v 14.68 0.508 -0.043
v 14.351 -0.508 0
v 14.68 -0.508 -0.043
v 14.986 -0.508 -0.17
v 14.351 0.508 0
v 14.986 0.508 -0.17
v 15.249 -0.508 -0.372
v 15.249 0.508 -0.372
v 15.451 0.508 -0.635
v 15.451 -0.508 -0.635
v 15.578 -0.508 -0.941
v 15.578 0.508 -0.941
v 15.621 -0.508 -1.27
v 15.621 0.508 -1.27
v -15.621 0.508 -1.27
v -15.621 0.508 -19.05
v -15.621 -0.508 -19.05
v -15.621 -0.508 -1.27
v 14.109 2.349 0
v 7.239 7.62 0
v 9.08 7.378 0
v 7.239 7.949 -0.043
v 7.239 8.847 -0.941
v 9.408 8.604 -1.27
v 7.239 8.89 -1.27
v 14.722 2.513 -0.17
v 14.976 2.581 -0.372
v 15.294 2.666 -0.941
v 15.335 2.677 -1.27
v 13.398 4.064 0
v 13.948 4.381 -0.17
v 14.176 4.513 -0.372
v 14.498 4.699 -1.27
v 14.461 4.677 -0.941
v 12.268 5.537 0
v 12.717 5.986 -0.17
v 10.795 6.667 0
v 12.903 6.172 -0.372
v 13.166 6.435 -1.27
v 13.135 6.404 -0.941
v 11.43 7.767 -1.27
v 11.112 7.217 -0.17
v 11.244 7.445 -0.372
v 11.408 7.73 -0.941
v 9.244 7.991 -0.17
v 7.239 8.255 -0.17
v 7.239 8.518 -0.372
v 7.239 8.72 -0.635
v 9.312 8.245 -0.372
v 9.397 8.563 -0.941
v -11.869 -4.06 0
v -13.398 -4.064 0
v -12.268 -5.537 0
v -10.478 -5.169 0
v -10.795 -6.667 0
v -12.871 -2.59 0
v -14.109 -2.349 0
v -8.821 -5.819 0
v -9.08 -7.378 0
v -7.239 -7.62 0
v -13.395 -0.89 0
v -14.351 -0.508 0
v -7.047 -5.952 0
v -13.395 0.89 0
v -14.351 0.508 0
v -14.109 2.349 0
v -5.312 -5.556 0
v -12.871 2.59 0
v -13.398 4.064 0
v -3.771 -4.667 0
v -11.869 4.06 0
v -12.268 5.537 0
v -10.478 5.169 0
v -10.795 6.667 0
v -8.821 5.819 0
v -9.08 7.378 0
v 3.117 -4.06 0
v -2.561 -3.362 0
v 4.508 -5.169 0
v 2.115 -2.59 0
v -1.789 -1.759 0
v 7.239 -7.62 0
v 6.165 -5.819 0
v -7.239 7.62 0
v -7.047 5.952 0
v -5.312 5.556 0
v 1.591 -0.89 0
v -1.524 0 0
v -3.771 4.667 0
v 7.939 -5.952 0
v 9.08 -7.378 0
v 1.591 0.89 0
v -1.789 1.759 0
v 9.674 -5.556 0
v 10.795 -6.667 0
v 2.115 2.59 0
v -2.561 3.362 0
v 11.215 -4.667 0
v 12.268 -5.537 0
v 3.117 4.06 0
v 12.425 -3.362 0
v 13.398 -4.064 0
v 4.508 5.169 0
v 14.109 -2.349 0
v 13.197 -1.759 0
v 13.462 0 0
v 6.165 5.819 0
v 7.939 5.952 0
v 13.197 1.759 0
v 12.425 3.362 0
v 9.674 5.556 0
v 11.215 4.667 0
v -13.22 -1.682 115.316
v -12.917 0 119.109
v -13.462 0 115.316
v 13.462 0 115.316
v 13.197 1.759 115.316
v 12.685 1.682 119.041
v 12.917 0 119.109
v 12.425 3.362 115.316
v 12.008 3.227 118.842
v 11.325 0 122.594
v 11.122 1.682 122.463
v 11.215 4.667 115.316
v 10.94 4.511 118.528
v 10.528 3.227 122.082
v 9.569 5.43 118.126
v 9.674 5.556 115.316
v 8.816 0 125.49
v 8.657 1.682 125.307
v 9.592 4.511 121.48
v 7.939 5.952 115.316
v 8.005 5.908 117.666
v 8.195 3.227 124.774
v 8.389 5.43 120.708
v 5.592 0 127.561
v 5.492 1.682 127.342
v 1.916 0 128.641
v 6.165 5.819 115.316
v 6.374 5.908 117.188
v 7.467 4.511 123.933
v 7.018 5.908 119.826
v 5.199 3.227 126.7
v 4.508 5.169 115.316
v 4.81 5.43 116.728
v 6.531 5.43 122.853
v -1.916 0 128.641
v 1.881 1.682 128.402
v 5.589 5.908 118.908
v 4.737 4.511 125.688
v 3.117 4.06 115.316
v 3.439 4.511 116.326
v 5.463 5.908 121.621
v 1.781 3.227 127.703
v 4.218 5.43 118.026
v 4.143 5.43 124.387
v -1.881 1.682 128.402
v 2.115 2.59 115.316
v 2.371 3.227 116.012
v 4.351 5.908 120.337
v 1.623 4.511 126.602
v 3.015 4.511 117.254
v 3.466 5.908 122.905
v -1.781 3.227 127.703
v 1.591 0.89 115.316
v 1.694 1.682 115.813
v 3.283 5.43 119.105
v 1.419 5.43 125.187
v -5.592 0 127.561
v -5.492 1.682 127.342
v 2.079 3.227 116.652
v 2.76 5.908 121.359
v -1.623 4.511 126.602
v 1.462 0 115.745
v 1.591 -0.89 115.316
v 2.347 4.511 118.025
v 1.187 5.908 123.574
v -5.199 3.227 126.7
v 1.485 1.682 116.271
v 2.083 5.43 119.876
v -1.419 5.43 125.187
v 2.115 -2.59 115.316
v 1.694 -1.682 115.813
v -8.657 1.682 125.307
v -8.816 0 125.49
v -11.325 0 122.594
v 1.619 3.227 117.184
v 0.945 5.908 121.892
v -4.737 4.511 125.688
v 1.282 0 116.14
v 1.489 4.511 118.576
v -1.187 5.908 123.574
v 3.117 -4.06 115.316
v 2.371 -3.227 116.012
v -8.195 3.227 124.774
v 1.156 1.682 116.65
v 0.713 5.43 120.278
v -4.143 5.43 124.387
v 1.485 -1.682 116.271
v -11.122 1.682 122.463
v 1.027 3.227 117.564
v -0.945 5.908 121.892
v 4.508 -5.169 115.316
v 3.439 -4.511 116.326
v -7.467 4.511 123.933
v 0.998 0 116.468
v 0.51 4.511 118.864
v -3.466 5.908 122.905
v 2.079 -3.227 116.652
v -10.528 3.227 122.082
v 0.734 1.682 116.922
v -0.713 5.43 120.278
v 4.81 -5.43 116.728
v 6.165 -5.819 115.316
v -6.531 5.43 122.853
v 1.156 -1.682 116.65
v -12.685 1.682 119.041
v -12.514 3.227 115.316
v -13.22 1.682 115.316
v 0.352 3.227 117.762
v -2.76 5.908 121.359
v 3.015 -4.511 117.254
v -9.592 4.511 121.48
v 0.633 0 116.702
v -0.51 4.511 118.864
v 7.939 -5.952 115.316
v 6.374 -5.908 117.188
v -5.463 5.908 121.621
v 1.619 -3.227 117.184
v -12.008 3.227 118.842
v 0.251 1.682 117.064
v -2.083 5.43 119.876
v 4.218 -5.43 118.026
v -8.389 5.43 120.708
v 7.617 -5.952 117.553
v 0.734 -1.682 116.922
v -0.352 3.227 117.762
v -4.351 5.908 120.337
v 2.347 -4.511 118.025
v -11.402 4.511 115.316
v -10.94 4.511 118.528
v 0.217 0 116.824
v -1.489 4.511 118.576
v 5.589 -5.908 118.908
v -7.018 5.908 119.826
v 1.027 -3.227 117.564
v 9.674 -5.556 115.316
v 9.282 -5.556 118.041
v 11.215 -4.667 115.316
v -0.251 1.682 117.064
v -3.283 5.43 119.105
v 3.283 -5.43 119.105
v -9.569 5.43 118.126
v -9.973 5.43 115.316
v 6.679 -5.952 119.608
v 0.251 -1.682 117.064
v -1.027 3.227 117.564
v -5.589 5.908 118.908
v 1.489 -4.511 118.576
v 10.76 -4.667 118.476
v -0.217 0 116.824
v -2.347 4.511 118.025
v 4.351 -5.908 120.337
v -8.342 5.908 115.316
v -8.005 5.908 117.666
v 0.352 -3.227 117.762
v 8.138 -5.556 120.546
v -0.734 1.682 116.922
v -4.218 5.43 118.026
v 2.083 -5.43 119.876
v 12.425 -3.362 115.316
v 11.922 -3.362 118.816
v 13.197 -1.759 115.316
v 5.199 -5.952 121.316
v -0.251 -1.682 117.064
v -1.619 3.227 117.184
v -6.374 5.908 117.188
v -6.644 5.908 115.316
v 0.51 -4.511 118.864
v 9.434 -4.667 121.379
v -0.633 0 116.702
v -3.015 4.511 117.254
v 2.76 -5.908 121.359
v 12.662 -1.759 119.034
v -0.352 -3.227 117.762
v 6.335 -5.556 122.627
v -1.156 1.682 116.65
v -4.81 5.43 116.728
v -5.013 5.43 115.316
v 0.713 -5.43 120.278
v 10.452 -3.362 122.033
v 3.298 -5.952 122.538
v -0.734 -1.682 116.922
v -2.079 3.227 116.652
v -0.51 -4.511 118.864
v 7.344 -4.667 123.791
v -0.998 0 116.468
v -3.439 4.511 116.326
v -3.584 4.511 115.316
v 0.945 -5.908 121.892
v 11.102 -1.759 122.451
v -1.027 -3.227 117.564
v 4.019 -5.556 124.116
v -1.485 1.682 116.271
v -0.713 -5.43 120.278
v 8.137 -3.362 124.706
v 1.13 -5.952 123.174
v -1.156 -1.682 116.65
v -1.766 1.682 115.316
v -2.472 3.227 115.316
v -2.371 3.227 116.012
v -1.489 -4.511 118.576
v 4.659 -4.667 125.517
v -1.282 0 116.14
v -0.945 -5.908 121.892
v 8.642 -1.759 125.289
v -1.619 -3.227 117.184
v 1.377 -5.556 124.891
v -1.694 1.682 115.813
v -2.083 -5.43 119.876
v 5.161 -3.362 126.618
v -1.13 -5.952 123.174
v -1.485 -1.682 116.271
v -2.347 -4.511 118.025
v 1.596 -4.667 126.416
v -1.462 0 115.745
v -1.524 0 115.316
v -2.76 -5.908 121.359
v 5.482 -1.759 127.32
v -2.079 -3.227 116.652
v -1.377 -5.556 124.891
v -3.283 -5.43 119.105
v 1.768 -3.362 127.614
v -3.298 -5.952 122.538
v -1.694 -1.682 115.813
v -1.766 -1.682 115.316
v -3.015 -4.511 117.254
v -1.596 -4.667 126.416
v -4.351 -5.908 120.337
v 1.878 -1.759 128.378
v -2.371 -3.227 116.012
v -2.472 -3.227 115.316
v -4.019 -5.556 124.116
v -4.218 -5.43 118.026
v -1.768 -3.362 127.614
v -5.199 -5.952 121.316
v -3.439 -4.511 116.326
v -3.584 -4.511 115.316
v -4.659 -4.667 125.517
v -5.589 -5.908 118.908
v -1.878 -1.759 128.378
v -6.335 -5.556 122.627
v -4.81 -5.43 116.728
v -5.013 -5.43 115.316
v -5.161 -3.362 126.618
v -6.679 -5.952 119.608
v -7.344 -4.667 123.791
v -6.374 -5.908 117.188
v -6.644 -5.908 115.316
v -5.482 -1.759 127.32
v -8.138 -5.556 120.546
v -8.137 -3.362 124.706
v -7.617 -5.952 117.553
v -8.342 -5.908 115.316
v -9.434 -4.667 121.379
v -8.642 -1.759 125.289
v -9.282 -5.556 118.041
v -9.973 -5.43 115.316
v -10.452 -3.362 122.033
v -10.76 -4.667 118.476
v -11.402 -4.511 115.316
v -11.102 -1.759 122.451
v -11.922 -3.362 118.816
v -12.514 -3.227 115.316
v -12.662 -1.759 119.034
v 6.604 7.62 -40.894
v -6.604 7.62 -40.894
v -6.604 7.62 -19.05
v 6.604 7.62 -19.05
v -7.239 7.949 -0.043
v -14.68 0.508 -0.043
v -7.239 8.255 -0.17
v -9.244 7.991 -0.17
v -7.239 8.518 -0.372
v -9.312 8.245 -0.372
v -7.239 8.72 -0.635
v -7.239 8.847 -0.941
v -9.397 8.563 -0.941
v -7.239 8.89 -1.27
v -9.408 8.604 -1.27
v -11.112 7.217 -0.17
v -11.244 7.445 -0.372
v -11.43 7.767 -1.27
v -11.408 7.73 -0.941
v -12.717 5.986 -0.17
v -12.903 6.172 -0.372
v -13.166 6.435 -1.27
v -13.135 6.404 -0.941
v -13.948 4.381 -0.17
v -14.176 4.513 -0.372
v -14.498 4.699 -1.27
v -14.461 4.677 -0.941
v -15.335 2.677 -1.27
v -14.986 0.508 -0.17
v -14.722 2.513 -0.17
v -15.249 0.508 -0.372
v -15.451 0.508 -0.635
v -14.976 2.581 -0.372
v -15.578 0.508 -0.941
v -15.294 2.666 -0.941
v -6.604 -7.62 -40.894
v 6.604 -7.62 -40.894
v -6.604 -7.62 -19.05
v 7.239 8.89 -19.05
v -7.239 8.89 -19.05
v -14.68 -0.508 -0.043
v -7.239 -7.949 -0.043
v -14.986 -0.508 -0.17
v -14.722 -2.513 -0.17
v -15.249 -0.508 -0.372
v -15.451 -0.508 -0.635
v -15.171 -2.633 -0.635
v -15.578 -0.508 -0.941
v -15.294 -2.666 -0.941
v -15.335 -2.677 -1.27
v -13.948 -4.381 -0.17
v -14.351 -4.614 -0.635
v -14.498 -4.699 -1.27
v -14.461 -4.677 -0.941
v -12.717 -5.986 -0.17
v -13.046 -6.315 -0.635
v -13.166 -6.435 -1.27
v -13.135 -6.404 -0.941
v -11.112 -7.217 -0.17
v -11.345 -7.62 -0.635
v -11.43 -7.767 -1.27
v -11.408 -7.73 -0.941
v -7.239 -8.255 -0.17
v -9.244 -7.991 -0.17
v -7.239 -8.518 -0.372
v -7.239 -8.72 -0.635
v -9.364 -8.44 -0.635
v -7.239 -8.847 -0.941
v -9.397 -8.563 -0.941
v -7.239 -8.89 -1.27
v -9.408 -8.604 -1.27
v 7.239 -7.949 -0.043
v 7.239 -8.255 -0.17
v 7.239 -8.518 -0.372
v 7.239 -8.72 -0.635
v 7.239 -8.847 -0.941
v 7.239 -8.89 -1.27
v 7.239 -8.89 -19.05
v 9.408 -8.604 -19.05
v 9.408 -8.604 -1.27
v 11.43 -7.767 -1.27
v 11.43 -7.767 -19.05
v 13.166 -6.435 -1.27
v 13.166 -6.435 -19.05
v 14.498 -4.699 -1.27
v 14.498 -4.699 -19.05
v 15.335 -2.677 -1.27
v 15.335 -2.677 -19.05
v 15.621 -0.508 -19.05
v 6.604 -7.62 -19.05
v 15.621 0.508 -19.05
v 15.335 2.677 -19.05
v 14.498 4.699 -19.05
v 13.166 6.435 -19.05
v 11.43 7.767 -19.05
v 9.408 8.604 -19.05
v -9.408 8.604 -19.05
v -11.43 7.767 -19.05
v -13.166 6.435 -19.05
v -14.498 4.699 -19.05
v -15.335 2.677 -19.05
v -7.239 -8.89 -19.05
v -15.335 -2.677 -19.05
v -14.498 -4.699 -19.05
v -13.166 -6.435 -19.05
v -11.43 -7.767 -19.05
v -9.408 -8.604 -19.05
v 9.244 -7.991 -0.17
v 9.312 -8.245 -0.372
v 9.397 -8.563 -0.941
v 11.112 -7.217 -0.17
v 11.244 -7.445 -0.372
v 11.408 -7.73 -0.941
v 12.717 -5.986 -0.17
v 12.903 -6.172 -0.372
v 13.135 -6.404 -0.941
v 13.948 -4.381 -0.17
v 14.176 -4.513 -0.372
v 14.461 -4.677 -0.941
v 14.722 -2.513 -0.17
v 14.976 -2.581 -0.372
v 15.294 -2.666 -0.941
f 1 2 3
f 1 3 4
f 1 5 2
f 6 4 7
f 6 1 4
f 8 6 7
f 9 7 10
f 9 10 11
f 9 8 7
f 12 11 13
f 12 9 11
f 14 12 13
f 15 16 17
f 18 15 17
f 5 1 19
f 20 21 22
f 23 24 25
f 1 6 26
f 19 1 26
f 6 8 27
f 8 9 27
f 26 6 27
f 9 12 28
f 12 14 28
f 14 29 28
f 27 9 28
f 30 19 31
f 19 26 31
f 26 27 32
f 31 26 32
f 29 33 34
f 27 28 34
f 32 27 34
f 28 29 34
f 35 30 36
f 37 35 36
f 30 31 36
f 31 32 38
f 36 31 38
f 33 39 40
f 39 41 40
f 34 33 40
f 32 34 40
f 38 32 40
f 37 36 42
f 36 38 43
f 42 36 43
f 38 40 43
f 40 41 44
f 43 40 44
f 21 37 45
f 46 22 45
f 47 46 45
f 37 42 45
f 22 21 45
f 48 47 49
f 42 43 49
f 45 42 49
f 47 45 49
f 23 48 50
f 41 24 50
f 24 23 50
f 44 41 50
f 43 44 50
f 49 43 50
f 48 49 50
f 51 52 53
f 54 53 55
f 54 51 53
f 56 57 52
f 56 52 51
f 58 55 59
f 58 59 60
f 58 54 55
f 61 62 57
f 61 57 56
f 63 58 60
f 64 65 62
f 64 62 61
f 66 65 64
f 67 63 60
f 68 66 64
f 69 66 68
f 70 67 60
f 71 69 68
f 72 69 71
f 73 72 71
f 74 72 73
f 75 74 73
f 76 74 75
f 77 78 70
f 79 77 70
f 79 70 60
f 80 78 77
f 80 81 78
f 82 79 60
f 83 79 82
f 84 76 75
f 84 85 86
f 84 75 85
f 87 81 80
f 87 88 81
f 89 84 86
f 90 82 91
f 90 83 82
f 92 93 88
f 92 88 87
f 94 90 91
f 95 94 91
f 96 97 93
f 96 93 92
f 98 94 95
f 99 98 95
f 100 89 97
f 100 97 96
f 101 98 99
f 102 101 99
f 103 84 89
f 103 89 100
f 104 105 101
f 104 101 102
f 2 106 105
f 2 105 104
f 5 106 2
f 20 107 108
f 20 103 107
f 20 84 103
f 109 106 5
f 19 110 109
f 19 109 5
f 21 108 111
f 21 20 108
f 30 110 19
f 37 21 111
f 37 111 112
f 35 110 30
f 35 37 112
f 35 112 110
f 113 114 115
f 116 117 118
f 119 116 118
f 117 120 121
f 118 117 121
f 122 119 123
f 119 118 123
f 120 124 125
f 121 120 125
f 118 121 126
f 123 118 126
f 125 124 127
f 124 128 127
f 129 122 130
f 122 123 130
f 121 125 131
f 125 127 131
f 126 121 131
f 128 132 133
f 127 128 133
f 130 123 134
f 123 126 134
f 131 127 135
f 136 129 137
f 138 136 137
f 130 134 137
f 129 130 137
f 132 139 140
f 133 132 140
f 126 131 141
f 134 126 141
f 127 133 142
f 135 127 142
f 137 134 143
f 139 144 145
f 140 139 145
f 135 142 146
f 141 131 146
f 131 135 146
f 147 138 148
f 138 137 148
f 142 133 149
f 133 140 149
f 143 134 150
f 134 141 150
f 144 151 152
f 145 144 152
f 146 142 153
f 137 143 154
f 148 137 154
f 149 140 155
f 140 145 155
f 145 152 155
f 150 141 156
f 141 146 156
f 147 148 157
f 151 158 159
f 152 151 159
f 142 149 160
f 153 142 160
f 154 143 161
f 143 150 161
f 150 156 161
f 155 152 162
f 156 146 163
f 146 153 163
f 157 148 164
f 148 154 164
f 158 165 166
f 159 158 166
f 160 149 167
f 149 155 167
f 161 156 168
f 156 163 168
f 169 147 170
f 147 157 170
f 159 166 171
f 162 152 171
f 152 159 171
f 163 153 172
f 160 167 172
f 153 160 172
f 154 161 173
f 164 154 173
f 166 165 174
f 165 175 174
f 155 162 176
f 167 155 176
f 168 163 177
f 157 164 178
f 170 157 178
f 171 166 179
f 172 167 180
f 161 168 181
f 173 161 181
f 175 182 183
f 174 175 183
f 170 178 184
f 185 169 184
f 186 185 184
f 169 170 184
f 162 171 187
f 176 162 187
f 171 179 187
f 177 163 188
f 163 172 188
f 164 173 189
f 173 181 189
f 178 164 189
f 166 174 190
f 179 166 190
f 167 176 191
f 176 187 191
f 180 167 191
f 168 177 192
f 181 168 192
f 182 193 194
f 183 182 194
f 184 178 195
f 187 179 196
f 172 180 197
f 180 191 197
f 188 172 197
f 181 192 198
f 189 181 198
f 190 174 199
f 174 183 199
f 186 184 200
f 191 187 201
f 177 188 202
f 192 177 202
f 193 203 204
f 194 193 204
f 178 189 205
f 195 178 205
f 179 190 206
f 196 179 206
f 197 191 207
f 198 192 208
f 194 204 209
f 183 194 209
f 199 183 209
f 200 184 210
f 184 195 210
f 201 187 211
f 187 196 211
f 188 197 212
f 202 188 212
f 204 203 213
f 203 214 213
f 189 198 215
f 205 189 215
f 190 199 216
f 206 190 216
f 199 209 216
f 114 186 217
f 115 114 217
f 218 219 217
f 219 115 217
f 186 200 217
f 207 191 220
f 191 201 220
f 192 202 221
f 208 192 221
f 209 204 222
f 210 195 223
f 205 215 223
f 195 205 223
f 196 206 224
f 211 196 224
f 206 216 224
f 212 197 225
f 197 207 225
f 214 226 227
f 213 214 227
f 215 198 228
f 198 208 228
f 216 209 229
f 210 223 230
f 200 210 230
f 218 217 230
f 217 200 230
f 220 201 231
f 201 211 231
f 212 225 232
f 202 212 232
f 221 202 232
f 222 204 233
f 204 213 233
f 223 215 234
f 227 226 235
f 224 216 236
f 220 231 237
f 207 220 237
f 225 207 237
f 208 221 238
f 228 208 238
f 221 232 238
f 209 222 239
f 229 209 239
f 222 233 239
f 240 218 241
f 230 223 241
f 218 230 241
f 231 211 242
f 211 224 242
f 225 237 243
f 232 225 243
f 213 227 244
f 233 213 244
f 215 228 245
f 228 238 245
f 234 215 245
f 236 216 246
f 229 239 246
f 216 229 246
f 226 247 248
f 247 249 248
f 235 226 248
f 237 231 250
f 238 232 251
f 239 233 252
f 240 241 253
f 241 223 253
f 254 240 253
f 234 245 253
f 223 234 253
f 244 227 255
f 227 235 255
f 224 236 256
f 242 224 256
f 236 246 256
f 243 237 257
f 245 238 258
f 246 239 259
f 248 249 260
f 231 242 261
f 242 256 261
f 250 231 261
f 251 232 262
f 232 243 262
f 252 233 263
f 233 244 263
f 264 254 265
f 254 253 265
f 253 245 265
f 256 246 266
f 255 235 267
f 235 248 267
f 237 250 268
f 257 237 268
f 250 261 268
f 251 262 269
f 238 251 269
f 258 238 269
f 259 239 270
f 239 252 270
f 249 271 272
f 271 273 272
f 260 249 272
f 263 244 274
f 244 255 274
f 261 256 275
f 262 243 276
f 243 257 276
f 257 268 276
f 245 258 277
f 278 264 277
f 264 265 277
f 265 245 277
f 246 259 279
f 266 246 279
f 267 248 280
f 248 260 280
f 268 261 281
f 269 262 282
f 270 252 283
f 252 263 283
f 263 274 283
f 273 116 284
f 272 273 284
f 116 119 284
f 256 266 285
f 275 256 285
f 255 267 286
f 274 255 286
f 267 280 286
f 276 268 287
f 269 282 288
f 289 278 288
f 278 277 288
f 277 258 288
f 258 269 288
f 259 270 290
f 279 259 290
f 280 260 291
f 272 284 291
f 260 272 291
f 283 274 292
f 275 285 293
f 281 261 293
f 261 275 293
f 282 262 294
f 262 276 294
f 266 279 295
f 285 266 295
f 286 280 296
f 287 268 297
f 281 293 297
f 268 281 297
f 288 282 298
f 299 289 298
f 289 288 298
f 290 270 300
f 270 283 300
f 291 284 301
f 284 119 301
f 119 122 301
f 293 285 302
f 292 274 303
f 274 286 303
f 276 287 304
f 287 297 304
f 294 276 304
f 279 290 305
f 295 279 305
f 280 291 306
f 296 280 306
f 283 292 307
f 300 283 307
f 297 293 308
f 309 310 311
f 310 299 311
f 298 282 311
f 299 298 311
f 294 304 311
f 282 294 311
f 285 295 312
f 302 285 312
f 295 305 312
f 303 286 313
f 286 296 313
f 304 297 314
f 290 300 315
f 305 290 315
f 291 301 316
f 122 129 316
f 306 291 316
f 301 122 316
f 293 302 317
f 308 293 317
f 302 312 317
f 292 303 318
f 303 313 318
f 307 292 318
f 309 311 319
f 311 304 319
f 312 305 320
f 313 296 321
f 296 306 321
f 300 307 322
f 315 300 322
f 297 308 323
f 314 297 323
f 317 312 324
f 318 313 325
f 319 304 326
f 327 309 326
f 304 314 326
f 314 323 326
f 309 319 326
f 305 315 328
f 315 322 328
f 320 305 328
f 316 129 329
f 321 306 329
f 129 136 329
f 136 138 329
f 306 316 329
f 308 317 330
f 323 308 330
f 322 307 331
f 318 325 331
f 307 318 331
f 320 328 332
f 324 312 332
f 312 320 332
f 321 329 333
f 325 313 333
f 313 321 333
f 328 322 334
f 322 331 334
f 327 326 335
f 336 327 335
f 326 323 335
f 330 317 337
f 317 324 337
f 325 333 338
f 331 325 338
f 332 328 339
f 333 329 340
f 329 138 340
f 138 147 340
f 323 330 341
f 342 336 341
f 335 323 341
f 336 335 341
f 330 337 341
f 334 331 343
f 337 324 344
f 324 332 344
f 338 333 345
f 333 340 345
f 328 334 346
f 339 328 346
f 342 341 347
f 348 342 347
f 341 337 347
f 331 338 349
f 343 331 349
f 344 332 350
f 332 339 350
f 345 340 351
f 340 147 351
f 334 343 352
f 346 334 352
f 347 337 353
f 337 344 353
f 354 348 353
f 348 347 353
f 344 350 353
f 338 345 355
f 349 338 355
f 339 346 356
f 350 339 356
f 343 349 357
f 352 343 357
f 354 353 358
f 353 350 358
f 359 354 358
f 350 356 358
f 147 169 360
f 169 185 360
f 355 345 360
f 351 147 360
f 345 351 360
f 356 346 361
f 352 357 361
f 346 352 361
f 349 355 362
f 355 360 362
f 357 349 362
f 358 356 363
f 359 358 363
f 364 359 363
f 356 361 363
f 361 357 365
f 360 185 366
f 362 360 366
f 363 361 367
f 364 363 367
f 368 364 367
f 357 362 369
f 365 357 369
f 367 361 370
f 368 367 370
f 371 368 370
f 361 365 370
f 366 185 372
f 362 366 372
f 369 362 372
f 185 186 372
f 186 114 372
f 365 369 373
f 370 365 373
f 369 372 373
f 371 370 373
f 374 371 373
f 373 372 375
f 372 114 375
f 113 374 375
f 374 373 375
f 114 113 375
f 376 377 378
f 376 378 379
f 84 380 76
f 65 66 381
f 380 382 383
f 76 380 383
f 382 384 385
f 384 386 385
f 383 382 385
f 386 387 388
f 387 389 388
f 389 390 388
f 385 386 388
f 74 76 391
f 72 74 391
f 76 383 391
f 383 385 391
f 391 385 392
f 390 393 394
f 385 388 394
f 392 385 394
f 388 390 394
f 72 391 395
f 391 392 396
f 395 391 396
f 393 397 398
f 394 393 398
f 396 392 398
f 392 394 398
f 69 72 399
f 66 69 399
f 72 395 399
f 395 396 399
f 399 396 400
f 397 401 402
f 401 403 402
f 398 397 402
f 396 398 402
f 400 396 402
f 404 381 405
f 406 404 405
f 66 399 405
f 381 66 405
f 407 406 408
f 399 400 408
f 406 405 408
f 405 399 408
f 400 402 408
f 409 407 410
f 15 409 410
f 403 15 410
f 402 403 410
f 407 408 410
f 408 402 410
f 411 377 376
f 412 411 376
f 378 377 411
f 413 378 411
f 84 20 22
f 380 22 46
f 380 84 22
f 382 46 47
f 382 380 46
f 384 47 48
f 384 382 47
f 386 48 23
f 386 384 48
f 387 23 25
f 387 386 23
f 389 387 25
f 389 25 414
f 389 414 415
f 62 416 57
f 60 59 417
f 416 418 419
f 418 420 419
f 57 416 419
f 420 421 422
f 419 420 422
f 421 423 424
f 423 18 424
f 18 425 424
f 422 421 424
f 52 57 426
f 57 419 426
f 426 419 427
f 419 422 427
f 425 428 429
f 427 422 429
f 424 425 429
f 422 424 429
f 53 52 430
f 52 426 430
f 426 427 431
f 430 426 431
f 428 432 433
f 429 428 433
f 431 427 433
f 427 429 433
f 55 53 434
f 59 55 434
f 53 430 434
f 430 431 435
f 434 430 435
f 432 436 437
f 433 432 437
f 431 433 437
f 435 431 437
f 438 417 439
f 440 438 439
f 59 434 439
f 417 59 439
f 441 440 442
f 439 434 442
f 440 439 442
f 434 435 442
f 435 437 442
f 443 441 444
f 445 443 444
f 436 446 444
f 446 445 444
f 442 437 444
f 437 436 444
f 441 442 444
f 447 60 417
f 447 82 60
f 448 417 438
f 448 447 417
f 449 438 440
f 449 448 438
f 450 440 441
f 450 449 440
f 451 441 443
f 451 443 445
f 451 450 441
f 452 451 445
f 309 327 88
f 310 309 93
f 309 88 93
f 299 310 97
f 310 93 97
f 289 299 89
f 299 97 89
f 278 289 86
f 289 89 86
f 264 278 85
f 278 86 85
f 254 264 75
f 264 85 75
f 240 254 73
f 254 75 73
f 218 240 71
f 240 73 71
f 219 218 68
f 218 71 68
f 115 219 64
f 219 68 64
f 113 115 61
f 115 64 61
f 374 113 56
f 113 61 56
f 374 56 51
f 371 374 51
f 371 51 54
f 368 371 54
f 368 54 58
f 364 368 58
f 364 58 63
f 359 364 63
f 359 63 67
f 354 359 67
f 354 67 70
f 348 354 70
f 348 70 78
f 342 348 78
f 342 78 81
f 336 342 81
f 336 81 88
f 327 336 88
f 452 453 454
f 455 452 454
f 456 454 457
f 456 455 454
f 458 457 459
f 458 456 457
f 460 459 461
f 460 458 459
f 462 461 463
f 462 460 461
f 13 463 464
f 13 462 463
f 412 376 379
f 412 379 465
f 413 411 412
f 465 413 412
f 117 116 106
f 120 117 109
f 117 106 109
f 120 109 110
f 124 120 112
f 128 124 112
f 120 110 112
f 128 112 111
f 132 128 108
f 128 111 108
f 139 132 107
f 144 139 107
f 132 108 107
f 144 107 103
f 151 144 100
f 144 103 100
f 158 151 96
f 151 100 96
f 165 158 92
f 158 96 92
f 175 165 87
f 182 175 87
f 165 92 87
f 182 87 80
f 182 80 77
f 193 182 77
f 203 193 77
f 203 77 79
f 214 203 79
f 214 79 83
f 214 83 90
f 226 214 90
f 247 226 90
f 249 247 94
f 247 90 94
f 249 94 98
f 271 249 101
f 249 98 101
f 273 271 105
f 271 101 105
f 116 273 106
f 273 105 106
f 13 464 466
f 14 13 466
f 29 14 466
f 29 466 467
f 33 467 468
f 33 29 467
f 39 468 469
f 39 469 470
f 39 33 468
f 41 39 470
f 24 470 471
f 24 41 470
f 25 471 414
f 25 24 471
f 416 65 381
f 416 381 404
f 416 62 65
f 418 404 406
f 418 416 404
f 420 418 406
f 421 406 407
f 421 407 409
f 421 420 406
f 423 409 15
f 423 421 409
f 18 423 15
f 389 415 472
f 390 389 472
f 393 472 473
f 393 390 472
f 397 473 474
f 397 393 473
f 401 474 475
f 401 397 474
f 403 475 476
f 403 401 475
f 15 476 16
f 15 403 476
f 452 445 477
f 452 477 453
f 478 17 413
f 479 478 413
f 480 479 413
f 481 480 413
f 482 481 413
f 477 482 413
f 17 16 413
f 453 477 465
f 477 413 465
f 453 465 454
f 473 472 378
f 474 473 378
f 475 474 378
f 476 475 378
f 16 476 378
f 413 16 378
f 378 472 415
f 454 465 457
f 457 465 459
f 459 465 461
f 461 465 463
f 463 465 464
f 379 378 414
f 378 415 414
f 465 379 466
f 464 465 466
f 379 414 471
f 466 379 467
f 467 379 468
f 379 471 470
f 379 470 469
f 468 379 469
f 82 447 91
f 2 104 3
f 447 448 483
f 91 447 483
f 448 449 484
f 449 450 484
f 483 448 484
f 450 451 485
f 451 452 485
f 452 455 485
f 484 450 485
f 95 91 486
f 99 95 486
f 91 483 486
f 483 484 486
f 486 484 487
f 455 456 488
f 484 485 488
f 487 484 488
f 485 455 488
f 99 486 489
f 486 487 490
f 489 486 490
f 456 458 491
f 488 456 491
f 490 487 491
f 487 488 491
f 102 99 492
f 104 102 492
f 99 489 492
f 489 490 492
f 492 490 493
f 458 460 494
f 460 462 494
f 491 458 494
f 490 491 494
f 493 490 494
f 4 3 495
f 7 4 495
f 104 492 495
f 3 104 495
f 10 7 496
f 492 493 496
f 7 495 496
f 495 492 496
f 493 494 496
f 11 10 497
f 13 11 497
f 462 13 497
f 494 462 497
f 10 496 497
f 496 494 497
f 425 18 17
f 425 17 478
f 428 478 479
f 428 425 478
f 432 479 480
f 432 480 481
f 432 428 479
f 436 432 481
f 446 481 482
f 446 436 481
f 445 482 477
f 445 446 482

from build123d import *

# Parameters (mm, degrees)
F0_R      = 5.969
F1_DEPTH  = 115.316
F3_DEPTH  = 19.05
F1_FACE_R = 5.969
F5_ANGLE  = -180
F6_R      = 1.27
F7_W      = 13.208
F7_H      = 15.24
F8_DEPTH  = 21.844


with BuildPart() as f1:
    # F0 (on Top) → F1 (new body)
    with BuildSketch(Plane.XY):
        with Locations((7.493, 0)):
            Circle(F0_R)
        with Locations((-7.493, 0)):
            Circle(F0_R)
    extrude(amount=F1_DEPTH)

    # F2 (on Top) → F3 (join)
    with BuildSketch(Plane.XY):
        with BuildLine():
            ThreePointArc((-15.621, -0.508), (-13.165969, -6.434969), (-7.239, -8.89))
            Line((-7.239, -8.89), (7.239, -8.89))
            ThreePointArc((7.239, -8.89), (13.165969, -6.434969), (15.621, -0.508))
            Line((15.621, -0.508), (15.621, 0.508))
            ThreePointArc((15.621, 0.508), (13.165969, 6.434969), (7.239, 8.89))
            Line((7.239, 8.89), (-7.239, 8.89))
            ThreePointArc((-7.239, 8.89), (-13.165969, 6.434969), (-15.621, 0.508))
            Line((-15.621, 0.508), (-15.621, -0.508))
        make_face()
    extrude(amount=-F3_DEPTH)

    # F1_face (on face) → F5 (revolve)
    with BuildSketch(Plane(origin=(-7.493, 0, 115.316), x_dir=(1, 0, 0), z_dir=(0, 0, 1))):
        with Locations((14.986, 0)):
            Circle(F1_FACE_R)
    revolve(axis=Axis((0, 21.043353, 115.316), (0, 1, 0)), revolution_arc=F5_ANGLE)

    # F6
    f6_edges = [f1.edges().sort_by_distance(p)[0] for p in [
        (0, -8.89, 0),
    ]]
    fillet(f6_edges, radius=F6_R)

    # F7 (on face) → F8 (join)
    with BuildSketch(Plane(origin=(0, 0, -19.05), x_dir=(1, 0, 0), z_dir=(0, 0, -1))):
        Rectangle(F7_W, F7_H)
    extrude(amount=F8_DEPTH)


solid = f1.part
